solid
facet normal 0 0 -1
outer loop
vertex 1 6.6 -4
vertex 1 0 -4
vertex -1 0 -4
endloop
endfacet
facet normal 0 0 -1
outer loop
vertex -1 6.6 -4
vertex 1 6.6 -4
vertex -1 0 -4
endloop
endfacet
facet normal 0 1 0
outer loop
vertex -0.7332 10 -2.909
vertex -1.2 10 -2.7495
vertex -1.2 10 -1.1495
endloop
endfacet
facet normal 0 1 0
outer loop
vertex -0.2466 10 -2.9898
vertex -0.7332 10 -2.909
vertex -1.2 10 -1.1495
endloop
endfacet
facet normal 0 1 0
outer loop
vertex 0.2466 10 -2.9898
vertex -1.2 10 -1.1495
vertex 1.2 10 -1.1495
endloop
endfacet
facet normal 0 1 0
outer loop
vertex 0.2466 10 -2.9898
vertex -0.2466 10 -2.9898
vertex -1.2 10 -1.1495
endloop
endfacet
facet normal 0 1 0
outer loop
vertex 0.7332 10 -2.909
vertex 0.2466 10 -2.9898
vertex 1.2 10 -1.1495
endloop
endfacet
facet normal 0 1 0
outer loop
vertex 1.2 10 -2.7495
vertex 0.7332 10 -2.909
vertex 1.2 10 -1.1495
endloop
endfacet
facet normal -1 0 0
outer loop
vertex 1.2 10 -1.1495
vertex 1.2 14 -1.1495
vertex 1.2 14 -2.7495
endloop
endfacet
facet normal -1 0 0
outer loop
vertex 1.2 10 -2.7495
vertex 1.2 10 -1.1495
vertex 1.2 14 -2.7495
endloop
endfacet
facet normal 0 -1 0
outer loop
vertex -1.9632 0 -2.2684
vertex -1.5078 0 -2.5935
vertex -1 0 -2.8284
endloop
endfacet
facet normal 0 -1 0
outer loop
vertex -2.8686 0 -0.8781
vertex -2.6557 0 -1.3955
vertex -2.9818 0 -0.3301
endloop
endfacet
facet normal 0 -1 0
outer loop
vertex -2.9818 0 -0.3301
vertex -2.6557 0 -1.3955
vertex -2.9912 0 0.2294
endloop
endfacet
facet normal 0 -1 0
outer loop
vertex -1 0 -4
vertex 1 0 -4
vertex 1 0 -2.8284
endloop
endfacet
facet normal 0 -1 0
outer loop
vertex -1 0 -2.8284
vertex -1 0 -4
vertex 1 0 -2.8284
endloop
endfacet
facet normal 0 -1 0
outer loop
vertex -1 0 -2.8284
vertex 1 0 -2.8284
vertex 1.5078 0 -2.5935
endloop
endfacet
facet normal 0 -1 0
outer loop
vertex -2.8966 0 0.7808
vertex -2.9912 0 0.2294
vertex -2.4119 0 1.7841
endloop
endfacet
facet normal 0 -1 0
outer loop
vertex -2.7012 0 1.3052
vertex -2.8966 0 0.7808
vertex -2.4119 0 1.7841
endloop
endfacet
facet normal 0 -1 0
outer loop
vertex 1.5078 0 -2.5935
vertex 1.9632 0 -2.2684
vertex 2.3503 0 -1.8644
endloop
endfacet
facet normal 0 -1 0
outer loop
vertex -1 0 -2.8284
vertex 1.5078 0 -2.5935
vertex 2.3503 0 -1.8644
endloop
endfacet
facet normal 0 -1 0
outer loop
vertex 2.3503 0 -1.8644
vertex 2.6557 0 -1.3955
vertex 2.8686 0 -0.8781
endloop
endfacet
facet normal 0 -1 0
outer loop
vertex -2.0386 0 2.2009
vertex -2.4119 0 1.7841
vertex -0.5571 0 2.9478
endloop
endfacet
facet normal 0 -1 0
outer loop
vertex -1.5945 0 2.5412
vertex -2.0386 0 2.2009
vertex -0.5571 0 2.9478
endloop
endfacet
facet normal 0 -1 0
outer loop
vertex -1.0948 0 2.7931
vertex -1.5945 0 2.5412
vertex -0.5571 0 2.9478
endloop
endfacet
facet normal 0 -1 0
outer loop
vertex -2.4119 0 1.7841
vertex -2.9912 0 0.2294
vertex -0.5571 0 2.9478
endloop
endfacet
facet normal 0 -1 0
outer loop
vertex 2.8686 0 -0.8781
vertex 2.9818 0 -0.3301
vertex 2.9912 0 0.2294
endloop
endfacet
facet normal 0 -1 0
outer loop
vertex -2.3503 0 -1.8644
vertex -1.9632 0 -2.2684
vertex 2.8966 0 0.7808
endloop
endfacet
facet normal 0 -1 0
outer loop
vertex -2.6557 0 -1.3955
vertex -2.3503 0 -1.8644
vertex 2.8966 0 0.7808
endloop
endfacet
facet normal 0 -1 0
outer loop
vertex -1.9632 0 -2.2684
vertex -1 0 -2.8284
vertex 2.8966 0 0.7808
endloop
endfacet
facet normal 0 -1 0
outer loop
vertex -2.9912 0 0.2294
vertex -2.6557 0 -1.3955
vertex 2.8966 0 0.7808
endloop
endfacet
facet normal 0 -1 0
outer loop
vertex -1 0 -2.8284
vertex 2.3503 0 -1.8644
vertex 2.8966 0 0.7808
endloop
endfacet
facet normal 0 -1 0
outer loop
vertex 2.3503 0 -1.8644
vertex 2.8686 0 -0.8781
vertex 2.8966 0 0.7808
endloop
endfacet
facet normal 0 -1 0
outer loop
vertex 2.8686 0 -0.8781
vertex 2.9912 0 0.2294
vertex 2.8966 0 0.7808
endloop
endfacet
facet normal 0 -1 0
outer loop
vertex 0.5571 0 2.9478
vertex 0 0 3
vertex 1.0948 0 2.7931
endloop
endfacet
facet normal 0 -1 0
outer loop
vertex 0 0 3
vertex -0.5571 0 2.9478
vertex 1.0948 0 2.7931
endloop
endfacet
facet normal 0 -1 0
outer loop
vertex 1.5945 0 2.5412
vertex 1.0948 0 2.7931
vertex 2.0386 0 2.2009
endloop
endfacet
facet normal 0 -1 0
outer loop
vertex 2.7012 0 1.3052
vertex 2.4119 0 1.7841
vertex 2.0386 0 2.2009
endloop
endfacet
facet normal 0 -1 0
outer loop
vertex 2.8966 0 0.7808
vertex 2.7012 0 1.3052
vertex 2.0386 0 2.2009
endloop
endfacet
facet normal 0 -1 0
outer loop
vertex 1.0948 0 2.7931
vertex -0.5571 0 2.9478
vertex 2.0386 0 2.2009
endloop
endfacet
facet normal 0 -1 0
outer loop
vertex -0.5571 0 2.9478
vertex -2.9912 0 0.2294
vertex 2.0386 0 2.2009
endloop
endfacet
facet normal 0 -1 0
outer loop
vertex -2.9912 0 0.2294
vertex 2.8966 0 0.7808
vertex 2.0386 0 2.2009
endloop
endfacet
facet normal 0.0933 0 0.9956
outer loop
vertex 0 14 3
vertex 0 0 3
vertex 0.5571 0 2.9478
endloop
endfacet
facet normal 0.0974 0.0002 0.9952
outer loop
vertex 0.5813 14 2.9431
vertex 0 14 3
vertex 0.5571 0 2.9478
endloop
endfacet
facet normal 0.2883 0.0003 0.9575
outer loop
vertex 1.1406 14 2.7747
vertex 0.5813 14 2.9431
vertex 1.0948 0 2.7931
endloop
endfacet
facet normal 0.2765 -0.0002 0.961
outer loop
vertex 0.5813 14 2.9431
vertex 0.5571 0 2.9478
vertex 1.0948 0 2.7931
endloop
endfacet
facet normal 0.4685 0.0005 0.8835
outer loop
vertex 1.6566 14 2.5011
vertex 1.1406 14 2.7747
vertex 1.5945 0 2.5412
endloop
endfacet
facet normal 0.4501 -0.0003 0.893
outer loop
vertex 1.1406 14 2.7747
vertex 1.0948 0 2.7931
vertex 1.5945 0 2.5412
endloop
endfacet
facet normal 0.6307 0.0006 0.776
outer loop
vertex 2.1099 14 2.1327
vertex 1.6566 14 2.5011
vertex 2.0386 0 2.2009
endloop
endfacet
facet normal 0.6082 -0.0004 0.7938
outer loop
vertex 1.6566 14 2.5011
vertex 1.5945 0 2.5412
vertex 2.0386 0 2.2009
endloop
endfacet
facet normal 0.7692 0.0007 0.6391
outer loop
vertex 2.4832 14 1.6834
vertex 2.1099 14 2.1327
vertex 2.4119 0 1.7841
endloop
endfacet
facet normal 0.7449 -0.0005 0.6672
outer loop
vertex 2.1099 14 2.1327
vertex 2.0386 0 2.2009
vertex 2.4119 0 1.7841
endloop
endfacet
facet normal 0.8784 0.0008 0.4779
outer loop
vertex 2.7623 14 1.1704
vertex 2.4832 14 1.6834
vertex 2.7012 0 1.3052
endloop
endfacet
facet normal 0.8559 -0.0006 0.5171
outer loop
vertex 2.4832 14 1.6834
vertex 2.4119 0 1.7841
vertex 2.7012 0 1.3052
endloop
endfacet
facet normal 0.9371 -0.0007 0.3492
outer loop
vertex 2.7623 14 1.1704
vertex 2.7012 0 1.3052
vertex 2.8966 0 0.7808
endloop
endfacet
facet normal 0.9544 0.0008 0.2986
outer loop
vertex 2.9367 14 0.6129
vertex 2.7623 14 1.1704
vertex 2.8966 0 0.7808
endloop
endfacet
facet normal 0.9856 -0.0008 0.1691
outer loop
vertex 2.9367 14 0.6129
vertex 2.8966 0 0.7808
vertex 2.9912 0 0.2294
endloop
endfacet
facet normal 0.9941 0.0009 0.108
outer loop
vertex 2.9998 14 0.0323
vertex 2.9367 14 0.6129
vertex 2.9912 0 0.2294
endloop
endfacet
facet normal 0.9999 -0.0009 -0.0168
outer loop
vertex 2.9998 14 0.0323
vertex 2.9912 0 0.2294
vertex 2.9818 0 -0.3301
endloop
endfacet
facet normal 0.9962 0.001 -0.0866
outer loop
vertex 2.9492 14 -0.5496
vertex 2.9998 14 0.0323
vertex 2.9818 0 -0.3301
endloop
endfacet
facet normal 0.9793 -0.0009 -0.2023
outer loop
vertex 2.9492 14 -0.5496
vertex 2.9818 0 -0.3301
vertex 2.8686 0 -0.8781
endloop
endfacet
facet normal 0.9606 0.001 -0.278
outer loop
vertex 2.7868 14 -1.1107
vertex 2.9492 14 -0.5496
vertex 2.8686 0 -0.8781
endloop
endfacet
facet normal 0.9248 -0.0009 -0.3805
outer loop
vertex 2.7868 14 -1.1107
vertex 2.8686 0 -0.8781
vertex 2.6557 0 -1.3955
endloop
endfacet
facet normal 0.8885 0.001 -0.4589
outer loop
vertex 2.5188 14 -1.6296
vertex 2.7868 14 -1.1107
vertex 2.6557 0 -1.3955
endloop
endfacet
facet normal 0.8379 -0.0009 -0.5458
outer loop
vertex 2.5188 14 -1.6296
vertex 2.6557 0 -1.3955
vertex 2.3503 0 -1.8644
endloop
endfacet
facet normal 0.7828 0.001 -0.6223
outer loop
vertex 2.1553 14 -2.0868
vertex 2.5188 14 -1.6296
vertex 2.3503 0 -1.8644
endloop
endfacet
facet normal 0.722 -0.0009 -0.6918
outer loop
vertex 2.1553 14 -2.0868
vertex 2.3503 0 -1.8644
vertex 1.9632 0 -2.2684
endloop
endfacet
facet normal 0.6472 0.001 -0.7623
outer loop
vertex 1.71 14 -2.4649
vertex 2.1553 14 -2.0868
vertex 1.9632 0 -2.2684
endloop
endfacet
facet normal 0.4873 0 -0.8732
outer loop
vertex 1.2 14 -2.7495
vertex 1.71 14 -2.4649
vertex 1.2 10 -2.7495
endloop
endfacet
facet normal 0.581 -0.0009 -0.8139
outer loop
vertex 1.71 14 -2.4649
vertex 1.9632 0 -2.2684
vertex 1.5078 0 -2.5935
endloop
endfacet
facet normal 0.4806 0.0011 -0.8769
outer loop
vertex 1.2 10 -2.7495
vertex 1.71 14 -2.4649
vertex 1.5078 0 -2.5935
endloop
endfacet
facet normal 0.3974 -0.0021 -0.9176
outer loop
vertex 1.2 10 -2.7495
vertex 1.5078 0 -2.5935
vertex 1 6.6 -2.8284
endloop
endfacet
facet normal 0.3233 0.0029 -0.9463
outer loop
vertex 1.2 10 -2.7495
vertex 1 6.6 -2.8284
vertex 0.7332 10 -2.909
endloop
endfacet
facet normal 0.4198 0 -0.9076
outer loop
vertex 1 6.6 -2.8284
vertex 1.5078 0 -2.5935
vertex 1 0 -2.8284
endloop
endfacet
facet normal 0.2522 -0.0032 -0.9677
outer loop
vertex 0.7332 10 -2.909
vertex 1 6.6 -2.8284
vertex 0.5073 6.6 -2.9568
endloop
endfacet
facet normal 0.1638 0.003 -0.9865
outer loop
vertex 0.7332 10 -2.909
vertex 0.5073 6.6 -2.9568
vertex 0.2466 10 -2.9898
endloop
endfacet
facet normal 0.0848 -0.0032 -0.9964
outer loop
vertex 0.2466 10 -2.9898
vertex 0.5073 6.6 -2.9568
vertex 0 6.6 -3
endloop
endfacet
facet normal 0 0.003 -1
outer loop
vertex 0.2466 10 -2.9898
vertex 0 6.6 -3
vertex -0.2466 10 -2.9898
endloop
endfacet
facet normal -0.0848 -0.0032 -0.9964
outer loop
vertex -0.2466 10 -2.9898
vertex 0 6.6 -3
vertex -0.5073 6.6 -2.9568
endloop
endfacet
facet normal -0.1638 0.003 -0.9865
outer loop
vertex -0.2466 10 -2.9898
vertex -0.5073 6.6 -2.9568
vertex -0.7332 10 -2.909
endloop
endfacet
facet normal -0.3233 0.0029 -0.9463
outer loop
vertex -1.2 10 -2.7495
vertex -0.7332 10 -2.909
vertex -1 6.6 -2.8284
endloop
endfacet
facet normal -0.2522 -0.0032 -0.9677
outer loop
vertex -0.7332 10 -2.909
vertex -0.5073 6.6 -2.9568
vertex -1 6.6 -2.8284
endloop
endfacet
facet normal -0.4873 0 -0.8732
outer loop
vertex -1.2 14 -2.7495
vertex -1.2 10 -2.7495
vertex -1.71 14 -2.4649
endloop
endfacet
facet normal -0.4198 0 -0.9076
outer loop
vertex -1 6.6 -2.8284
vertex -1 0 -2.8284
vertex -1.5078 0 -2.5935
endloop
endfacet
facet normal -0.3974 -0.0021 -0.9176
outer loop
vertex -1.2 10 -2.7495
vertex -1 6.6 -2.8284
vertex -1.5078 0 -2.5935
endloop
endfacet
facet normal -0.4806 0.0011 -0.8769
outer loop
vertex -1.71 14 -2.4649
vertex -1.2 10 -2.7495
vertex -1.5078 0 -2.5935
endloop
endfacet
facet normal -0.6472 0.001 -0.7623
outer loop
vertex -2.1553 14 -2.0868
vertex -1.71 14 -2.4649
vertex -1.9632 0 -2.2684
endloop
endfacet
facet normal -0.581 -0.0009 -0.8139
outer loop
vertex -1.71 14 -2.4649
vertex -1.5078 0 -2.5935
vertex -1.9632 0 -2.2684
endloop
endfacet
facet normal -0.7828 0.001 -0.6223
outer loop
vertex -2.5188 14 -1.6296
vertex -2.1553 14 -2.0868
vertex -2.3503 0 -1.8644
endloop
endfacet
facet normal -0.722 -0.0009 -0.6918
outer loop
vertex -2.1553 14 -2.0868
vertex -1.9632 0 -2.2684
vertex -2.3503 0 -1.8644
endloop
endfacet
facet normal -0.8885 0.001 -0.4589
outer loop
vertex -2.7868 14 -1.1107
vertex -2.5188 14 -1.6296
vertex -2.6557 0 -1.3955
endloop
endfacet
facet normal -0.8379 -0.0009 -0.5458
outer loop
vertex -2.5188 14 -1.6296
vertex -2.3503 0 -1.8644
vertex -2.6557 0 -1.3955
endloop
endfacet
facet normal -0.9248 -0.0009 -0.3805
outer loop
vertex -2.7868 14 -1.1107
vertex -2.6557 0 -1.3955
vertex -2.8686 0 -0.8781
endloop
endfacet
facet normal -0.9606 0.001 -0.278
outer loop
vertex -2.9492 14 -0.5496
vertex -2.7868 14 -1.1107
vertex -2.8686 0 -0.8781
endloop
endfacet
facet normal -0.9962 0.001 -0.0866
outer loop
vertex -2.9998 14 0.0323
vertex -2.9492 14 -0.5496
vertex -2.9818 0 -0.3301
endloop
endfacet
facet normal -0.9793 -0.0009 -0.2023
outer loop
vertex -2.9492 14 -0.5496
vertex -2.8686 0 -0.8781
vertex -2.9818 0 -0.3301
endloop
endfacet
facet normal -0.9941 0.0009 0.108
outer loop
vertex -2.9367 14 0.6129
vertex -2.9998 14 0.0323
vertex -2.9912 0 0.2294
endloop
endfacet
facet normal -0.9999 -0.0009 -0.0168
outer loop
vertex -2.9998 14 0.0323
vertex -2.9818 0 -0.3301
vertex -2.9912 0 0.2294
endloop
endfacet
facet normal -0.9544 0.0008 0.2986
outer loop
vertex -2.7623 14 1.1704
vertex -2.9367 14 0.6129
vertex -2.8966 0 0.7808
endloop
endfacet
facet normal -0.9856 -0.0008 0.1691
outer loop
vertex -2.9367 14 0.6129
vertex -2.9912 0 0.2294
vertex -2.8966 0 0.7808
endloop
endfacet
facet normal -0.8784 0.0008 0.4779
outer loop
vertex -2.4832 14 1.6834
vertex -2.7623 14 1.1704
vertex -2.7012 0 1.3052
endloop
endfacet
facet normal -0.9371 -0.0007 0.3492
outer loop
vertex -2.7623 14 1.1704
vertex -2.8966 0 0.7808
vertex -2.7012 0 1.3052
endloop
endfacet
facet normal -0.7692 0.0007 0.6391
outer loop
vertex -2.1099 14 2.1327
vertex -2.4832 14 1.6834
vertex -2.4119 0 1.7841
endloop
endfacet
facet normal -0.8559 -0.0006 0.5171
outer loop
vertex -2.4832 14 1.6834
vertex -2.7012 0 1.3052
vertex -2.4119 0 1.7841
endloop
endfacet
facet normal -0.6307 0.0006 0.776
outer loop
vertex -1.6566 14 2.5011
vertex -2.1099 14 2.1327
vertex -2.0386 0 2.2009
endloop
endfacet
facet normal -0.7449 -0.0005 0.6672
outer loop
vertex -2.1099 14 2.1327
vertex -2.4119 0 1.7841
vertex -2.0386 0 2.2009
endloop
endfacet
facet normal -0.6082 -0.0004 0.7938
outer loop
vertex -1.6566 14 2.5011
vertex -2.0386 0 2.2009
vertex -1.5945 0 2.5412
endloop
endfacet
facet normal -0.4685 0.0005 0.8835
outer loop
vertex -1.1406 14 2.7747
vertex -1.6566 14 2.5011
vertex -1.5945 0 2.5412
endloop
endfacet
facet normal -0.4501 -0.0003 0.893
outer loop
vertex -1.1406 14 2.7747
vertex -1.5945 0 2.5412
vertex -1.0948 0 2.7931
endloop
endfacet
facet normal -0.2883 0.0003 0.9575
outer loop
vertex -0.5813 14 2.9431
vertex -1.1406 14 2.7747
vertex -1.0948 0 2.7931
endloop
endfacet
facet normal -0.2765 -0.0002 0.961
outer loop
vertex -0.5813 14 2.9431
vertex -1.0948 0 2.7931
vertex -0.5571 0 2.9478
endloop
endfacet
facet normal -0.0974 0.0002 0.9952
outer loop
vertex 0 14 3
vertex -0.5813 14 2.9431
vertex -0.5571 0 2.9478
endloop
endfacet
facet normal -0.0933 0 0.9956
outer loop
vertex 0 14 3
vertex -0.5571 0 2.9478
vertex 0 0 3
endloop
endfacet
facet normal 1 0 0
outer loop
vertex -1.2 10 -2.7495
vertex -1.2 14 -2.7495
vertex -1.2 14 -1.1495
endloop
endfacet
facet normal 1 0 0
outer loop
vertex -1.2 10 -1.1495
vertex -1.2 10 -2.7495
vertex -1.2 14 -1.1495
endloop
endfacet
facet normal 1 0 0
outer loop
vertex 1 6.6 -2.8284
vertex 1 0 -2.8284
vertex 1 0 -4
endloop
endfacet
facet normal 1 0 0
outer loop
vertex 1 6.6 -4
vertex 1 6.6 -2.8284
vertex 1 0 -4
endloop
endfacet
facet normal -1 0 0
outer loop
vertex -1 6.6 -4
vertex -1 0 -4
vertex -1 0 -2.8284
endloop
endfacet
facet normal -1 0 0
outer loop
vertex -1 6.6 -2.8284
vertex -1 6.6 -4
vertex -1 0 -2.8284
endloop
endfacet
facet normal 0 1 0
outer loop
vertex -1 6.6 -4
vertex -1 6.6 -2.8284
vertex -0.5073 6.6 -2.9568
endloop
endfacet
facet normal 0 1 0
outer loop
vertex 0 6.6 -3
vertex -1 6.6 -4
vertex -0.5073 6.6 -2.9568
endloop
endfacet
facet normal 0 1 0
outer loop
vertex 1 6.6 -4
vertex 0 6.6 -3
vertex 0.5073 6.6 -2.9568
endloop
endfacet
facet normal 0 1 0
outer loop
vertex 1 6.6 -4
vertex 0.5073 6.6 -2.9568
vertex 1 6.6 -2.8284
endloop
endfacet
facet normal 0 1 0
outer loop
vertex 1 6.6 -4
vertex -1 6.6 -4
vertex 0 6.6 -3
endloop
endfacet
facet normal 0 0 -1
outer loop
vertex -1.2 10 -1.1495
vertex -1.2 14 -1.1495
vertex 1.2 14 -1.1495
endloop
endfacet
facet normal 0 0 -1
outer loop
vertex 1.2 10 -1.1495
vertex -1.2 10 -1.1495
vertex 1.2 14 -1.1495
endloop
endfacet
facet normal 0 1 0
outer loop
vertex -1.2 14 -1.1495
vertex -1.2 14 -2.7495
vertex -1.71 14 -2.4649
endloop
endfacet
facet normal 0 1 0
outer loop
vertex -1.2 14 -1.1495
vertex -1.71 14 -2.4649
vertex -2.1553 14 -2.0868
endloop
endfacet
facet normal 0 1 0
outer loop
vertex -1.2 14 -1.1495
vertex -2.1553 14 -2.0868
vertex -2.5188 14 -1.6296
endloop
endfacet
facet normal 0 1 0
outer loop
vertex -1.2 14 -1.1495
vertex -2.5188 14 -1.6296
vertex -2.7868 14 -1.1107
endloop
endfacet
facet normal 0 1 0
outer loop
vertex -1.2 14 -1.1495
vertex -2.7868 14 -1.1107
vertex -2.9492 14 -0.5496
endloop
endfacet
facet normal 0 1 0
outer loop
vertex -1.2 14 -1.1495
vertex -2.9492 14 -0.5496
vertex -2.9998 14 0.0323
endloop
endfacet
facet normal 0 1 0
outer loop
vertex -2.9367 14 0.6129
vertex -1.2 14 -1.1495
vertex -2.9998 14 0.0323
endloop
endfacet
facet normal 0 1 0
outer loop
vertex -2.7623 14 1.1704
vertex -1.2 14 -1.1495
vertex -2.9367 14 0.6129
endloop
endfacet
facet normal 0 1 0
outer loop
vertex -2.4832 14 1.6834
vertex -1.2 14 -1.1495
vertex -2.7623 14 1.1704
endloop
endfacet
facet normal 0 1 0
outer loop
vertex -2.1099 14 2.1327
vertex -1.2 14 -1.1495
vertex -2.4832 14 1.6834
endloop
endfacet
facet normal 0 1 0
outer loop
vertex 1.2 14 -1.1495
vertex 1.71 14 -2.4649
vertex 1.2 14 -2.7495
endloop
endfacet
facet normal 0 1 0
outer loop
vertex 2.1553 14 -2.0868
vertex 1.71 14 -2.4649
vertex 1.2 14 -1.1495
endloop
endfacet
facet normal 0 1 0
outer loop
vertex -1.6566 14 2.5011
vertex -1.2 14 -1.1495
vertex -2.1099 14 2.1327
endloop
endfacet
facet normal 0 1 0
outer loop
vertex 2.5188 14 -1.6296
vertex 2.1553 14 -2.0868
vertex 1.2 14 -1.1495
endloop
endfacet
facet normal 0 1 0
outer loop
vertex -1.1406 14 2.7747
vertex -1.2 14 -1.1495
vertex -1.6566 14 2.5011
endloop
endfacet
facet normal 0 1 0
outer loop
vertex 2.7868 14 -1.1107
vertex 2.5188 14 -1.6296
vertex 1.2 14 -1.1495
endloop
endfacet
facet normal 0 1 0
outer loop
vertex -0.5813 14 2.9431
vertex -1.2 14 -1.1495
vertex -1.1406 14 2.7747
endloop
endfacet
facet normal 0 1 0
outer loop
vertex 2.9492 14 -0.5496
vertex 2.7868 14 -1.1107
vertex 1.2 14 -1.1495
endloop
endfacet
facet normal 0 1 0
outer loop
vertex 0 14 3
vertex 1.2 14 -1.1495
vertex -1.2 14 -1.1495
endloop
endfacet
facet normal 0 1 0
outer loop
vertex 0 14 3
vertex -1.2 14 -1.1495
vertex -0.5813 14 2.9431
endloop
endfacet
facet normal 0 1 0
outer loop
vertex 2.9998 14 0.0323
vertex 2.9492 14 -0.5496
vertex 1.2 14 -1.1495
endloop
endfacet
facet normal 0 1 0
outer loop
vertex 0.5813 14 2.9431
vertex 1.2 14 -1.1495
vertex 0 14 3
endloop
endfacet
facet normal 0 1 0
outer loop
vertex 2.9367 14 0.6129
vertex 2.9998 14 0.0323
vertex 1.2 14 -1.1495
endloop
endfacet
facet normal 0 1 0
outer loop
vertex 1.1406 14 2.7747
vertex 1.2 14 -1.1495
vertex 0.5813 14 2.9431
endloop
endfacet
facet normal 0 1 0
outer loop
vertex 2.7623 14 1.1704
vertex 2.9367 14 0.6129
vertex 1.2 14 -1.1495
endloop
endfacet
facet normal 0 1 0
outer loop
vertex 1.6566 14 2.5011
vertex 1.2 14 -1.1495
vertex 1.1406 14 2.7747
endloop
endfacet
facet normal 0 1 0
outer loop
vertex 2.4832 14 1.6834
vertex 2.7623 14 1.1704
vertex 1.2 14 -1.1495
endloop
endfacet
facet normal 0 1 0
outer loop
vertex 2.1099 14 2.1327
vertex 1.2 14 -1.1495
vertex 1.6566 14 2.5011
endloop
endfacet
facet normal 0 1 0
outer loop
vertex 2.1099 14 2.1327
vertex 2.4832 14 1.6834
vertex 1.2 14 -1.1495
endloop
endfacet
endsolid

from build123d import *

# Parameters (mm, degrees)
EXTRUDE_2_DEPTH     = 14
EXTRUDE_3_DEPTH     = 6.6
CUT_EXTRUDE_1_DEPTH = 4


with BuildPart() as part:
    # 스케치1 → 보스-돌출2 (new body)
    with BuildSketch(Plane(origin=(0, 0, 0), x_dir=(1, 0, 0), z_dir=(0, 1, 0))):
        with BuildLine():
            ThreePointArc((1, 2.828427125), (0, 3), (-1, 2.828427125))
            ThreePointArc((-1, 2.828427125), (-1.732050808, -2.449489743), (3, 0))
            ThreePointArc((3, 0), (2.449489743, 1.732050808), (1, 2.828427125))
        make_face()
    extrude(amount=EXTRUDE_2_DEPTH)

    # 스케치1<3> → 보스-돌출3 (add)
    with BuildSketch(Plane(origin=(0, 0, 0), x_dir=(1, 0, 0), z_dir=(0, 1, 0))):
        with BuildLine():
            Line((-1, 4), (-1, 2.828427125))
            ThreePointArc((-1, 2.828427125), (0, 3), (1, 2.828427125))
            Line((1, 2.828427125), (1, 4))
            Line((1, 4), (-1, 4))
        make_face()
    extrude(amount=EXTRUDE_3_DEPTH)

    # 스케치2 → 컷-돌출1 (cut)
    with BuildSketch(Plane(origin=(0, 14, 0), x_dir=(1, 0, 0), z_dir=(0, 1, 0))):
        Polygon((-1.2, 1.149545417), (1.2, 1.149545417), (1.2, 2.749545417), (0, 4.828006386), (-1.2, 2.749545417), align=None)
    extrude(amount=-CUT_EXTRUDE_1_DEPTH, mode=Mode.SUBTRACT)


solid = part.part
